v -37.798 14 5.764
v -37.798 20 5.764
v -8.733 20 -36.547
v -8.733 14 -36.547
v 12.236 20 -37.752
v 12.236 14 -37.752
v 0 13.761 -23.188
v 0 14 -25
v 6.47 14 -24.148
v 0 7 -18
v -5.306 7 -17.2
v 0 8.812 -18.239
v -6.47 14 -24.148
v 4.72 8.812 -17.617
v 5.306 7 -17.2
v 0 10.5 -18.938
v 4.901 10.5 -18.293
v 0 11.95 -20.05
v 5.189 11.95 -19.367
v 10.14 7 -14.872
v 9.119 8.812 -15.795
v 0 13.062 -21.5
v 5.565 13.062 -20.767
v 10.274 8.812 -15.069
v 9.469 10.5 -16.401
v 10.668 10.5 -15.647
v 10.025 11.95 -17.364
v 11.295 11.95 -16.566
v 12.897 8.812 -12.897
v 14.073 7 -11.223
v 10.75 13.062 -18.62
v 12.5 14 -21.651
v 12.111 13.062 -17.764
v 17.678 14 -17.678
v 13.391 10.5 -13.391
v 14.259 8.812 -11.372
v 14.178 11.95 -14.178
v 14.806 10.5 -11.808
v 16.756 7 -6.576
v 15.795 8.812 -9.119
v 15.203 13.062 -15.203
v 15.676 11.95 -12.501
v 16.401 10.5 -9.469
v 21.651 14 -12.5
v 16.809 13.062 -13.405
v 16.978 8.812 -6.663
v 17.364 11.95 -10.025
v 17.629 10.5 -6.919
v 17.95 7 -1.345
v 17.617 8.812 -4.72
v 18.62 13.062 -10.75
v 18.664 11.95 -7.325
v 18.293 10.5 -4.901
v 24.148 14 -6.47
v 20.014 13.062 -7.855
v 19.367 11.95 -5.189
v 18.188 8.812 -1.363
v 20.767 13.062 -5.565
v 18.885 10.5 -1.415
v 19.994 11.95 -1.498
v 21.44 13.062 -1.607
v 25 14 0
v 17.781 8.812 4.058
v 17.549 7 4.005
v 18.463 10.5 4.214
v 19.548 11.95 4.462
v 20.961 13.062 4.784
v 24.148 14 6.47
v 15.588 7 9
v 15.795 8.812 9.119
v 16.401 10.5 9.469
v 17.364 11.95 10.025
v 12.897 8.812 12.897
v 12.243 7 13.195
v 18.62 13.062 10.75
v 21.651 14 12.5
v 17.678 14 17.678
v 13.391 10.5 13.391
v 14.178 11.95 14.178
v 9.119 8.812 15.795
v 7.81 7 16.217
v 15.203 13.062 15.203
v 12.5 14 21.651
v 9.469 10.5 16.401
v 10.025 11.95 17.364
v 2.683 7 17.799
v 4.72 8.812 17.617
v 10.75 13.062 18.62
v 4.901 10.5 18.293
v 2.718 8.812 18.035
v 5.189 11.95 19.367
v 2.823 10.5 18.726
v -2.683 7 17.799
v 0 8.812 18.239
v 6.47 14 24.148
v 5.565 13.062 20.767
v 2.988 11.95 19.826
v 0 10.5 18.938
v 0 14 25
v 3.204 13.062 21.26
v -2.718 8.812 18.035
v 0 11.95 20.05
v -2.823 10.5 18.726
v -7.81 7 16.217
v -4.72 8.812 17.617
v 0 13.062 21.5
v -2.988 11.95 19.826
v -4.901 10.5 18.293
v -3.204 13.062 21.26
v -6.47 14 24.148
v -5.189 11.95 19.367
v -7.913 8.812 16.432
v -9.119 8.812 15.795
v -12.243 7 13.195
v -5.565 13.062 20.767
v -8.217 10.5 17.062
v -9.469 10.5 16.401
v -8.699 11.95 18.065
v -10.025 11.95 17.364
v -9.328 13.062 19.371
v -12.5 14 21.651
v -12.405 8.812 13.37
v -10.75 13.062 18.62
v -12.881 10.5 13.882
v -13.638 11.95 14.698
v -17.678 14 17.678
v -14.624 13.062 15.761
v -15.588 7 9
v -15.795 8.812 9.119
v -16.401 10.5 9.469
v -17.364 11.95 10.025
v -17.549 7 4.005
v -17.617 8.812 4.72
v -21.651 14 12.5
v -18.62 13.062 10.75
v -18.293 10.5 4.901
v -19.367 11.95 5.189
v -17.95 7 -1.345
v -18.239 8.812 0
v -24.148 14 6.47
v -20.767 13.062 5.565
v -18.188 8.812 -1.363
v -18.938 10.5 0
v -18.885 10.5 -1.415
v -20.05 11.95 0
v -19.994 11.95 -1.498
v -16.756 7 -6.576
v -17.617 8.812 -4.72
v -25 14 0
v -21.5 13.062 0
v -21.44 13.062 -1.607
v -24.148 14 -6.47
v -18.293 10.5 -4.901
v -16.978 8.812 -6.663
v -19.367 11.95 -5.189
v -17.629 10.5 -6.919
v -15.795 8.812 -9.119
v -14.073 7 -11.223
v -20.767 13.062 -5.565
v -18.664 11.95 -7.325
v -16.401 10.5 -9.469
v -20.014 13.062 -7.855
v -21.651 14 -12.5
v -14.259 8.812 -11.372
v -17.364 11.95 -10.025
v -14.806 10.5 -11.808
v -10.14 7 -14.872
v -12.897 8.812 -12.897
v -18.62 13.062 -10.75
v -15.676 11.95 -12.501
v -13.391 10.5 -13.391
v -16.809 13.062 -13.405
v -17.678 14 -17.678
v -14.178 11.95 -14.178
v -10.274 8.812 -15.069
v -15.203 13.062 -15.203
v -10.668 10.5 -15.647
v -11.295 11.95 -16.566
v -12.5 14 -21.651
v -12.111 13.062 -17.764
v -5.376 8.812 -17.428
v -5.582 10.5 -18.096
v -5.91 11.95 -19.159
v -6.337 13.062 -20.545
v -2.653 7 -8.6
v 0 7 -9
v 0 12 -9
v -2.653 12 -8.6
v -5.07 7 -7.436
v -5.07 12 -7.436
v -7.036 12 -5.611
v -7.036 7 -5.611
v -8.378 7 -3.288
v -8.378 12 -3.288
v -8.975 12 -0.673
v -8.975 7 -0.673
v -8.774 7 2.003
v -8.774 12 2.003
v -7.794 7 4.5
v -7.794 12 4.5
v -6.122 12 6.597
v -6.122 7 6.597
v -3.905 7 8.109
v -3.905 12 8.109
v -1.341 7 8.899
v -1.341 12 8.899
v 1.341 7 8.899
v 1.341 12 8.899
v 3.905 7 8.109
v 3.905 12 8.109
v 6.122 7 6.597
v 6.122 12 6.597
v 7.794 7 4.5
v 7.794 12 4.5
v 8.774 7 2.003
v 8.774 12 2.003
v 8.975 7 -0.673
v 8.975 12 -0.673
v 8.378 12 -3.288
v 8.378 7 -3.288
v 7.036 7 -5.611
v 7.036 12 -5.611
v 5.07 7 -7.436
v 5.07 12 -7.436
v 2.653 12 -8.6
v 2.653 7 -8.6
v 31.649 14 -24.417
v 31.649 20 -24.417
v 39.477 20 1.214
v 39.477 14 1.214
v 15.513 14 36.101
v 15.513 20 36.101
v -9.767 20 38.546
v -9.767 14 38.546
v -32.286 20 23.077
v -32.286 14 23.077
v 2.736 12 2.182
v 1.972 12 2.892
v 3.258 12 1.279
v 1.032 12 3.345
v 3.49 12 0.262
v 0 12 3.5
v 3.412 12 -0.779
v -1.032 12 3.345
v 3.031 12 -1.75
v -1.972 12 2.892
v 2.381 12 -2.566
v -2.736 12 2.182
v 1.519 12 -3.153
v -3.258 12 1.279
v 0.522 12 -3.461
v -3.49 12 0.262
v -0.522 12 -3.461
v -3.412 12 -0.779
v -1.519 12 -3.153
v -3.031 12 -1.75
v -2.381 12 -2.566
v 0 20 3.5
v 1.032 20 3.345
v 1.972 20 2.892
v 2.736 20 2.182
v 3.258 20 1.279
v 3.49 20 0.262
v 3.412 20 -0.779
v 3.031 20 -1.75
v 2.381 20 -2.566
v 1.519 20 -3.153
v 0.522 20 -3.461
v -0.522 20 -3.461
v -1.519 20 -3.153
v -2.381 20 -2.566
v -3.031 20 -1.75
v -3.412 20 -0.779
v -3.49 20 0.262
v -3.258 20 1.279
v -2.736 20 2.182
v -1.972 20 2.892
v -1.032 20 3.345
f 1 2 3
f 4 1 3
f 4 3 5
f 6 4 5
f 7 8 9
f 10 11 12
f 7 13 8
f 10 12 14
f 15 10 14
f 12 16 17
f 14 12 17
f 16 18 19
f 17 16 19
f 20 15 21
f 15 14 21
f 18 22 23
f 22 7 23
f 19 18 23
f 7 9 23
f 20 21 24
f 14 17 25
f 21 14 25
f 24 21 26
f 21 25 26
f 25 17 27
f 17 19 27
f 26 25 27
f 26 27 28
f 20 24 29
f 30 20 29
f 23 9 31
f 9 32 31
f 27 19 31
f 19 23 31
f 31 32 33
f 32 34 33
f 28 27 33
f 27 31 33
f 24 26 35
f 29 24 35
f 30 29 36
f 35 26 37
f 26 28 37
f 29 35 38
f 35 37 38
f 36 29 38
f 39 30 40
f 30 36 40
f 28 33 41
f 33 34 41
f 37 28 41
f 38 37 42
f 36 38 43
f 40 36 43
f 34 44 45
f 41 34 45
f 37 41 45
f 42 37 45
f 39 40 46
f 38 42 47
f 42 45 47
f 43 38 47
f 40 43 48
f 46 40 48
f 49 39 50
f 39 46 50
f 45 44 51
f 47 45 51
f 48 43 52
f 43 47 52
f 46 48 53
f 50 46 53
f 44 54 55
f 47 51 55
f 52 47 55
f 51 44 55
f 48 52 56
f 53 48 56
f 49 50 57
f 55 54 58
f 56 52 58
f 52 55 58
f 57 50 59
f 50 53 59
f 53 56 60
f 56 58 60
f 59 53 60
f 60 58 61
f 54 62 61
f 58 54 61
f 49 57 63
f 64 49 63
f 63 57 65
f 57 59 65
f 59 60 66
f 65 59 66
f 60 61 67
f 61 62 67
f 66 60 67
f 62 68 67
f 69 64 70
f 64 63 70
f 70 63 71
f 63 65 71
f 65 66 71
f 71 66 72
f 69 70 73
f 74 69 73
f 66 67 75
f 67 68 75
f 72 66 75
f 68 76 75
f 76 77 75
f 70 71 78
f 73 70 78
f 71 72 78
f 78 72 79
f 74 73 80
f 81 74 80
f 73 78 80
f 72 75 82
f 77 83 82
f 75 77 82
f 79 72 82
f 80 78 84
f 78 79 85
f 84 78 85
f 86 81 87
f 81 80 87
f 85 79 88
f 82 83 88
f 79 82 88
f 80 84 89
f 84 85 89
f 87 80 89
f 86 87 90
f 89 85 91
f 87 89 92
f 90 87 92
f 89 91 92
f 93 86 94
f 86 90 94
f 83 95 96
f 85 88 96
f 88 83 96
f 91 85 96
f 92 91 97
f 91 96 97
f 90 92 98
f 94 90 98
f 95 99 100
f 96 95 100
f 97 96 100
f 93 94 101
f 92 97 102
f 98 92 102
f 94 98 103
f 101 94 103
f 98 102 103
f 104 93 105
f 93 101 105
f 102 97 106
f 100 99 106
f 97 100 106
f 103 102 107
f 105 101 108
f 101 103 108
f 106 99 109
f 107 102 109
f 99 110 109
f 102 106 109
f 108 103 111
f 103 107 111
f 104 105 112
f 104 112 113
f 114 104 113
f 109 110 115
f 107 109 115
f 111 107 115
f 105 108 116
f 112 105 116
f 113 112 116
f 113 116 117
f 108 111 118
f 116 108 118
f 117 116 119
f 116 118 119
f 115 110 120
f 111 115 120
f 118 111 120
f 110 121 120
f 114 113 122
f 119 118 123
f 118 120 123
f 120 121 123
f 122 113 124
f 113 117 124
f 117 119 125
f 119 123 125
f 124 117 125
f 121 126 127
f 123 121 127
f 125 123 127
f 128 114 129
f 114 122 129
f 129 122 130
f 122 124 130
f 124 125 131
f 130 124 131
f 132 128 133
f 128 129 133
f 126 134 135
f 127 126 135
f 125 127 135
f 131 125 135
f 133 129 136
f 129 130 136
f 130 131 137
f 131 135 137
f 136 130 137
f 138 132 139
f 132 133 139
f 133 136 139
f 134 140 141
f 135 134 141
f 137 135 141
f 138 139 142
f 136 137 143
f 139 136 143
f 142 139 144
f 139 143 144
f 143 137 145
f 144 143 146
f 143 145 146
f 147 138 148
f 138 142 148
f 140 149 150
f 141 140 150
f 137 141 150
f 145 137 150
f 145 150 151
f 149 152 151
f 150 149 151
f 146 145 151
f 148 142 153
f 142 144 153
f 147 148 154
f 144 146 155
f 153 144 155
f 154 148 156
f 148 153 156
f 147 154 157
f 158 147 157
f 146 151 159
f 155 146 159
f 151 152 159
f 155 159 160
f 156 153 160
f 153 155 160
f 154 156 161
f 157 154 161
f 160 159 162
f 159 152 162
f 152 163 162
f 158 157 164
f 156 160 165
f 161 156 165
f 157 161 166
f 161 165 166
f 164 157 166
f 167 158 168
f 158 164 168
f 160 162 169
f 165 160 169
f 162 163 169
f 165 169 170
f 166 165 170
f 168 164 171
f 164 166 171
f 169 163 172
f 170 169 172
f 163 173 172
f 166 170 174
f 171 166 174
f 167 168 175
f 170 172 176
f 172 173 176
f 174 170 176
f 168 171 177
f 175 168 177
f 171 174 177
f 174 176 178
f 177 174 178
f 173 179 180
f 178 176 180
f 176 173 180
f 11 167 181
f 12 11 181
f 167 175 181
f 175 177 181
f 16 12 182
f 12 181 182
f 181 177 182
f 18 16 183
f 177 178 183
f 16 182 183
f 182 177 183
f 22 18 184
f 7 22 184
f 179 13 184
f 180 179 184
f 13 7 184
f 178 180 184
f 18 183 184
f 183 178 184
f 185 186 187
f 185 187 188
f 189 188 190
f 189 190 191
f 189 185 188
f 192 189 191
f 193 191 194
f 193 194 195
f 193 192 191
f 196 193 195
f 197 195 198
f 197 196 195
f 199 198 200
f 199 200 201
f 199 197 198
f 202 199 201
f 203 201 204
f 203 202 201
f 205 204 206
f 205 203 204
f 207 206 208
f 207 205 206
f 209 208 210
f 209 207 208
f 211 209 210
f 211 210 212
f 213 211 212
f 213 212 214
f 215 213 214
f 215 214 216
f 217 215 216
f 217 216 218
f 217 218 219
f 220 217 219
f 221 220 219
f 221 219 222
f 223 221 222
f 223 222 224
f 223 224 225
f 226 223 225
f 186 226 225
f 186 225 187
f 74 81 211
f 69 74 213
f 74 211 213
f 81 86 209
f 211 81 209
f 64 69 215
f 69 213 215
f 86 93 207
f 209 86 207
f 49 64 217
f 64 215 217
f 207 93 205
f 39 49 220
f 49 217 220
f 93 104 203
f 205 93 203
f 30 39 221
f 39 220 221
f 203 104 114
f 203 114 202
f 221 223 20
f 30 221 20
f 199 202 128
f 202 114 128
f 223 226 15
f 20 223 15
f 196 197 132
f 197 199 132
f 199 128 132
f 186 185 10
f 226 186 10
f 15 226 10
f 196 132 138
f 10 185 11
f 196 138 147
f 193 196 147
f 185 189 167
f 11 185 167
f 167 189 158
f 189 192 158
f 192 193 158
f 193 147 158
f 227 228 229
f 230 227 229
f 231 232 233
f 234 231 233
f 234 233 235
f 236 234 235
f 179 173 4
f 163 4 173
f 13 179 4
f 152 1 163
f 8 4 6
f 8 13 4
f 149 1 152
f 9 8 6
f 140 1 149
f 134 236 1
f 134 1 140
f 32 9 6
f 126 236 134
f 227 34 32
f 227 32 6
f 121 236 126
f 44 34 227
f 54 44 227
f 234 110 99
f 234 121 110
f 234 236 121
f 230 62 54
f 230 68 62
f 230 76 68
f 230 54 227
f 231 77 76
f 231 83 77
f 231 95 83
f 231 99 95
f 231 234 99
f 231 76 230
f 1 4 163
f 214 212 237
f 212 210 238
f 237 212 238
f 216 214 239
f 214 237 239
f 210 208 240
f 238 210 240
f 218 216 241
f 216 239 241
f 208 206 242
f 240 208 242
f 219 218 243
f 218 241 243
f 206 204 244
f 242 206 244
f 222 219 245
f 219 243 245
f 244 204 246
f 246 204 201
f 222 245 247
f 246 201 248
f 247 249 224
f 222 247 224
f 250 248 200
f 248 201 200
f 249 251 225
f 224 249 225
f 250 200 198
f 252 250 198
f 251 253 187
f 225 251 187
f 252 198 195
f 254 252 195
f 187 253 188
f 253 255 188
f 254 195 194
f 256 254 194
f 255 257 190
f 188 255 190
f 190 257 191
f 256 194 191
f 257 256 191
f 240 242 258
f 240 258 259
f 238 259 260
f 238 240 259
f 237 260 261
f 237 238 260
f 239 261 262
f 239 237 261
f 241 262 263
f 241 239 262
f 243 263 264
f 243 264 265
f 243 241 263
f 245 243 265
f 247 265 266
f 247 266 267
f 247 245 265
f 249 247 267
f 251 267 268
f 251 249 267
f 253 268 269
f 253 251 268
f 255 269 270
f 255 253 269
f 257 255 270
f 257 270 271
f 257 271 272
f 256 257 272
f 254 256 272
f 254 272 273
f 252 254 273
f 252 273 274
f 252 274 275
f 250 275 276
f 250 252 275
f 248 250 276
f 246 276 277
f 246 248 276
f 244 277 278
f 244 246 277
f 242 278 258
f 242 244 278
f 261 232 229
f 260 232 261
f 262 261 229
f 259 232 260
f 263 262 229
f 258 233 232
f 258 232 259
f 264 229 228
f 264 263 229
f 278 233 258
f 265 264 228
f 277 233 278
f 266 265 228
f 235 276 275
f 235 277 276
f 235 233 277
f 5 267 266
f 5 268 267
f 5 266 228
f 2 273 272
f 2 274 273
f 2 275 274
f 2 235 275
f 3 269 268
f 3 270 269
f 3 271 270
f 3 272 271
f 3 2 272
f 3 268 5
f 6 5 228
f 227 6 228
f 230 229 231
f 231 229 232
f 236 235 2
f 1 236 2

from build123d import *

# Parameters (mm, degrees)
EXTRUDE_START         = 7
SKETCH_1_R            = 40
SKETCH_1_R_2          = 9
EXTRUDE_1_DEPTH       = 13
SKETCH_12_R           = 43.016285751
SKETCH_12_R_2         = 18
CUT_EXTRUDE_5_DEPTH   = 7
CUT_EXTRUDE_5_2_DEPTH = 10
EXTRUDE_START_2       = -8
SKETCH_17_R           = 9
SKETCH_17_R_2         = 3.5
EXTRUDE_6_DEPTH       = 8
FILLET_1_R            = 7


with BuildPart() as part:
    # Эскиз1 → Вытянуть1 (new body)
    with BuildSketch(Plane(origin=(0, 0, 0), x_dir=(1, 0, 0), z_dir=(0, 1, 0)).offset(EXTRUDE_START)):
        with Locations(Location((0, 0, 0), (0, 0, 90))):
            Circle(SKETCH_1_R)
        with Locations(Location((0, 0, 0), (0, 0, 90))):
            Circle(SKETCH_1_R_2, mode=Mode.SUBTRACT)
    extrude(amount=EXTRUDE_1_DEPTH)

    # Эскиз12 → Cut-Extrude 5 (cut)
    with BuildSketch(Plane.XZ.offset(-7)):
        Circle(SKETCH_12_R)
        with Locations(Location((0, 0, 0), (0, 0, 270))):
            Circle(SKETCH_12_R_2, mode=Mode.SUBTRACT)
    extrude(amount=-CUT_EXTRUDE_5_DEPTH, mode=Mode.SUBTRACT)

    # Эскиз16 → Cut-Extrude 5 2 (cut)
    with BuildSketch(Plane(origin=(0, 20, 0), x_dir=(1, 0, 0), z_dir=(0, 1, 0))):
        Polygon((-7.191454283, -44.519977242), (-37.881198424, -24.469576927), (-45.366952085, 5.371359597), (-23.143023154, 39.387971833), (7.640311576, 44.595915214), (37.770432201, 24.911131357), (46.151265064, -5.857681321), (23.11557492, -39.392615521), align=None)
        Polygon((-8.732909884, 36.547470459), (12.235760297, 37.752192063), (31.649059452, 24.416882045), (39.477467189, -1.213541002), (15.512644169, -36.101089761), (-9.76688891, -38.545852744), (-32.285837438, -23.077221806), (-37.797558071, -5.764310018), align=None, mode=Mode.SUBTRACT)
    extrude(amount=-CUT_EXTRUDE_5_2_DEPTH, mode=Mode.SUBTRACT)

    # Эскиз17 → Вытянуть6 (add)
    with BuildSketch(Plane(origin=(0, 20, 0), x_dir=(1, 0, 0), z_dir=(0, 1, 0)).offset(EXTRUDE_START_2)):
        with Locations(Location((0, 0, 0), (0, 0, 90))):
            Circle(SKETCH_17_R)
        with Locations(Location((0, 0, 0), (0, 0, 270))):
            Circle(SKETCH_17_R_2, mode=Mode.SUBTRACT)
    extrude(amount=EXTRUDE_6_DEPTH)

    # Скругление1
    fillet_1_edges = [part.edges().sort_by_distance(p)[0] for p in [
        (0, 14, 18),
    ]]
    fillet(fillet_1_edges, radius=FILLET_1_R - 0.0001)  # a hair under: the kernel refuses the full size


solid = part.part
